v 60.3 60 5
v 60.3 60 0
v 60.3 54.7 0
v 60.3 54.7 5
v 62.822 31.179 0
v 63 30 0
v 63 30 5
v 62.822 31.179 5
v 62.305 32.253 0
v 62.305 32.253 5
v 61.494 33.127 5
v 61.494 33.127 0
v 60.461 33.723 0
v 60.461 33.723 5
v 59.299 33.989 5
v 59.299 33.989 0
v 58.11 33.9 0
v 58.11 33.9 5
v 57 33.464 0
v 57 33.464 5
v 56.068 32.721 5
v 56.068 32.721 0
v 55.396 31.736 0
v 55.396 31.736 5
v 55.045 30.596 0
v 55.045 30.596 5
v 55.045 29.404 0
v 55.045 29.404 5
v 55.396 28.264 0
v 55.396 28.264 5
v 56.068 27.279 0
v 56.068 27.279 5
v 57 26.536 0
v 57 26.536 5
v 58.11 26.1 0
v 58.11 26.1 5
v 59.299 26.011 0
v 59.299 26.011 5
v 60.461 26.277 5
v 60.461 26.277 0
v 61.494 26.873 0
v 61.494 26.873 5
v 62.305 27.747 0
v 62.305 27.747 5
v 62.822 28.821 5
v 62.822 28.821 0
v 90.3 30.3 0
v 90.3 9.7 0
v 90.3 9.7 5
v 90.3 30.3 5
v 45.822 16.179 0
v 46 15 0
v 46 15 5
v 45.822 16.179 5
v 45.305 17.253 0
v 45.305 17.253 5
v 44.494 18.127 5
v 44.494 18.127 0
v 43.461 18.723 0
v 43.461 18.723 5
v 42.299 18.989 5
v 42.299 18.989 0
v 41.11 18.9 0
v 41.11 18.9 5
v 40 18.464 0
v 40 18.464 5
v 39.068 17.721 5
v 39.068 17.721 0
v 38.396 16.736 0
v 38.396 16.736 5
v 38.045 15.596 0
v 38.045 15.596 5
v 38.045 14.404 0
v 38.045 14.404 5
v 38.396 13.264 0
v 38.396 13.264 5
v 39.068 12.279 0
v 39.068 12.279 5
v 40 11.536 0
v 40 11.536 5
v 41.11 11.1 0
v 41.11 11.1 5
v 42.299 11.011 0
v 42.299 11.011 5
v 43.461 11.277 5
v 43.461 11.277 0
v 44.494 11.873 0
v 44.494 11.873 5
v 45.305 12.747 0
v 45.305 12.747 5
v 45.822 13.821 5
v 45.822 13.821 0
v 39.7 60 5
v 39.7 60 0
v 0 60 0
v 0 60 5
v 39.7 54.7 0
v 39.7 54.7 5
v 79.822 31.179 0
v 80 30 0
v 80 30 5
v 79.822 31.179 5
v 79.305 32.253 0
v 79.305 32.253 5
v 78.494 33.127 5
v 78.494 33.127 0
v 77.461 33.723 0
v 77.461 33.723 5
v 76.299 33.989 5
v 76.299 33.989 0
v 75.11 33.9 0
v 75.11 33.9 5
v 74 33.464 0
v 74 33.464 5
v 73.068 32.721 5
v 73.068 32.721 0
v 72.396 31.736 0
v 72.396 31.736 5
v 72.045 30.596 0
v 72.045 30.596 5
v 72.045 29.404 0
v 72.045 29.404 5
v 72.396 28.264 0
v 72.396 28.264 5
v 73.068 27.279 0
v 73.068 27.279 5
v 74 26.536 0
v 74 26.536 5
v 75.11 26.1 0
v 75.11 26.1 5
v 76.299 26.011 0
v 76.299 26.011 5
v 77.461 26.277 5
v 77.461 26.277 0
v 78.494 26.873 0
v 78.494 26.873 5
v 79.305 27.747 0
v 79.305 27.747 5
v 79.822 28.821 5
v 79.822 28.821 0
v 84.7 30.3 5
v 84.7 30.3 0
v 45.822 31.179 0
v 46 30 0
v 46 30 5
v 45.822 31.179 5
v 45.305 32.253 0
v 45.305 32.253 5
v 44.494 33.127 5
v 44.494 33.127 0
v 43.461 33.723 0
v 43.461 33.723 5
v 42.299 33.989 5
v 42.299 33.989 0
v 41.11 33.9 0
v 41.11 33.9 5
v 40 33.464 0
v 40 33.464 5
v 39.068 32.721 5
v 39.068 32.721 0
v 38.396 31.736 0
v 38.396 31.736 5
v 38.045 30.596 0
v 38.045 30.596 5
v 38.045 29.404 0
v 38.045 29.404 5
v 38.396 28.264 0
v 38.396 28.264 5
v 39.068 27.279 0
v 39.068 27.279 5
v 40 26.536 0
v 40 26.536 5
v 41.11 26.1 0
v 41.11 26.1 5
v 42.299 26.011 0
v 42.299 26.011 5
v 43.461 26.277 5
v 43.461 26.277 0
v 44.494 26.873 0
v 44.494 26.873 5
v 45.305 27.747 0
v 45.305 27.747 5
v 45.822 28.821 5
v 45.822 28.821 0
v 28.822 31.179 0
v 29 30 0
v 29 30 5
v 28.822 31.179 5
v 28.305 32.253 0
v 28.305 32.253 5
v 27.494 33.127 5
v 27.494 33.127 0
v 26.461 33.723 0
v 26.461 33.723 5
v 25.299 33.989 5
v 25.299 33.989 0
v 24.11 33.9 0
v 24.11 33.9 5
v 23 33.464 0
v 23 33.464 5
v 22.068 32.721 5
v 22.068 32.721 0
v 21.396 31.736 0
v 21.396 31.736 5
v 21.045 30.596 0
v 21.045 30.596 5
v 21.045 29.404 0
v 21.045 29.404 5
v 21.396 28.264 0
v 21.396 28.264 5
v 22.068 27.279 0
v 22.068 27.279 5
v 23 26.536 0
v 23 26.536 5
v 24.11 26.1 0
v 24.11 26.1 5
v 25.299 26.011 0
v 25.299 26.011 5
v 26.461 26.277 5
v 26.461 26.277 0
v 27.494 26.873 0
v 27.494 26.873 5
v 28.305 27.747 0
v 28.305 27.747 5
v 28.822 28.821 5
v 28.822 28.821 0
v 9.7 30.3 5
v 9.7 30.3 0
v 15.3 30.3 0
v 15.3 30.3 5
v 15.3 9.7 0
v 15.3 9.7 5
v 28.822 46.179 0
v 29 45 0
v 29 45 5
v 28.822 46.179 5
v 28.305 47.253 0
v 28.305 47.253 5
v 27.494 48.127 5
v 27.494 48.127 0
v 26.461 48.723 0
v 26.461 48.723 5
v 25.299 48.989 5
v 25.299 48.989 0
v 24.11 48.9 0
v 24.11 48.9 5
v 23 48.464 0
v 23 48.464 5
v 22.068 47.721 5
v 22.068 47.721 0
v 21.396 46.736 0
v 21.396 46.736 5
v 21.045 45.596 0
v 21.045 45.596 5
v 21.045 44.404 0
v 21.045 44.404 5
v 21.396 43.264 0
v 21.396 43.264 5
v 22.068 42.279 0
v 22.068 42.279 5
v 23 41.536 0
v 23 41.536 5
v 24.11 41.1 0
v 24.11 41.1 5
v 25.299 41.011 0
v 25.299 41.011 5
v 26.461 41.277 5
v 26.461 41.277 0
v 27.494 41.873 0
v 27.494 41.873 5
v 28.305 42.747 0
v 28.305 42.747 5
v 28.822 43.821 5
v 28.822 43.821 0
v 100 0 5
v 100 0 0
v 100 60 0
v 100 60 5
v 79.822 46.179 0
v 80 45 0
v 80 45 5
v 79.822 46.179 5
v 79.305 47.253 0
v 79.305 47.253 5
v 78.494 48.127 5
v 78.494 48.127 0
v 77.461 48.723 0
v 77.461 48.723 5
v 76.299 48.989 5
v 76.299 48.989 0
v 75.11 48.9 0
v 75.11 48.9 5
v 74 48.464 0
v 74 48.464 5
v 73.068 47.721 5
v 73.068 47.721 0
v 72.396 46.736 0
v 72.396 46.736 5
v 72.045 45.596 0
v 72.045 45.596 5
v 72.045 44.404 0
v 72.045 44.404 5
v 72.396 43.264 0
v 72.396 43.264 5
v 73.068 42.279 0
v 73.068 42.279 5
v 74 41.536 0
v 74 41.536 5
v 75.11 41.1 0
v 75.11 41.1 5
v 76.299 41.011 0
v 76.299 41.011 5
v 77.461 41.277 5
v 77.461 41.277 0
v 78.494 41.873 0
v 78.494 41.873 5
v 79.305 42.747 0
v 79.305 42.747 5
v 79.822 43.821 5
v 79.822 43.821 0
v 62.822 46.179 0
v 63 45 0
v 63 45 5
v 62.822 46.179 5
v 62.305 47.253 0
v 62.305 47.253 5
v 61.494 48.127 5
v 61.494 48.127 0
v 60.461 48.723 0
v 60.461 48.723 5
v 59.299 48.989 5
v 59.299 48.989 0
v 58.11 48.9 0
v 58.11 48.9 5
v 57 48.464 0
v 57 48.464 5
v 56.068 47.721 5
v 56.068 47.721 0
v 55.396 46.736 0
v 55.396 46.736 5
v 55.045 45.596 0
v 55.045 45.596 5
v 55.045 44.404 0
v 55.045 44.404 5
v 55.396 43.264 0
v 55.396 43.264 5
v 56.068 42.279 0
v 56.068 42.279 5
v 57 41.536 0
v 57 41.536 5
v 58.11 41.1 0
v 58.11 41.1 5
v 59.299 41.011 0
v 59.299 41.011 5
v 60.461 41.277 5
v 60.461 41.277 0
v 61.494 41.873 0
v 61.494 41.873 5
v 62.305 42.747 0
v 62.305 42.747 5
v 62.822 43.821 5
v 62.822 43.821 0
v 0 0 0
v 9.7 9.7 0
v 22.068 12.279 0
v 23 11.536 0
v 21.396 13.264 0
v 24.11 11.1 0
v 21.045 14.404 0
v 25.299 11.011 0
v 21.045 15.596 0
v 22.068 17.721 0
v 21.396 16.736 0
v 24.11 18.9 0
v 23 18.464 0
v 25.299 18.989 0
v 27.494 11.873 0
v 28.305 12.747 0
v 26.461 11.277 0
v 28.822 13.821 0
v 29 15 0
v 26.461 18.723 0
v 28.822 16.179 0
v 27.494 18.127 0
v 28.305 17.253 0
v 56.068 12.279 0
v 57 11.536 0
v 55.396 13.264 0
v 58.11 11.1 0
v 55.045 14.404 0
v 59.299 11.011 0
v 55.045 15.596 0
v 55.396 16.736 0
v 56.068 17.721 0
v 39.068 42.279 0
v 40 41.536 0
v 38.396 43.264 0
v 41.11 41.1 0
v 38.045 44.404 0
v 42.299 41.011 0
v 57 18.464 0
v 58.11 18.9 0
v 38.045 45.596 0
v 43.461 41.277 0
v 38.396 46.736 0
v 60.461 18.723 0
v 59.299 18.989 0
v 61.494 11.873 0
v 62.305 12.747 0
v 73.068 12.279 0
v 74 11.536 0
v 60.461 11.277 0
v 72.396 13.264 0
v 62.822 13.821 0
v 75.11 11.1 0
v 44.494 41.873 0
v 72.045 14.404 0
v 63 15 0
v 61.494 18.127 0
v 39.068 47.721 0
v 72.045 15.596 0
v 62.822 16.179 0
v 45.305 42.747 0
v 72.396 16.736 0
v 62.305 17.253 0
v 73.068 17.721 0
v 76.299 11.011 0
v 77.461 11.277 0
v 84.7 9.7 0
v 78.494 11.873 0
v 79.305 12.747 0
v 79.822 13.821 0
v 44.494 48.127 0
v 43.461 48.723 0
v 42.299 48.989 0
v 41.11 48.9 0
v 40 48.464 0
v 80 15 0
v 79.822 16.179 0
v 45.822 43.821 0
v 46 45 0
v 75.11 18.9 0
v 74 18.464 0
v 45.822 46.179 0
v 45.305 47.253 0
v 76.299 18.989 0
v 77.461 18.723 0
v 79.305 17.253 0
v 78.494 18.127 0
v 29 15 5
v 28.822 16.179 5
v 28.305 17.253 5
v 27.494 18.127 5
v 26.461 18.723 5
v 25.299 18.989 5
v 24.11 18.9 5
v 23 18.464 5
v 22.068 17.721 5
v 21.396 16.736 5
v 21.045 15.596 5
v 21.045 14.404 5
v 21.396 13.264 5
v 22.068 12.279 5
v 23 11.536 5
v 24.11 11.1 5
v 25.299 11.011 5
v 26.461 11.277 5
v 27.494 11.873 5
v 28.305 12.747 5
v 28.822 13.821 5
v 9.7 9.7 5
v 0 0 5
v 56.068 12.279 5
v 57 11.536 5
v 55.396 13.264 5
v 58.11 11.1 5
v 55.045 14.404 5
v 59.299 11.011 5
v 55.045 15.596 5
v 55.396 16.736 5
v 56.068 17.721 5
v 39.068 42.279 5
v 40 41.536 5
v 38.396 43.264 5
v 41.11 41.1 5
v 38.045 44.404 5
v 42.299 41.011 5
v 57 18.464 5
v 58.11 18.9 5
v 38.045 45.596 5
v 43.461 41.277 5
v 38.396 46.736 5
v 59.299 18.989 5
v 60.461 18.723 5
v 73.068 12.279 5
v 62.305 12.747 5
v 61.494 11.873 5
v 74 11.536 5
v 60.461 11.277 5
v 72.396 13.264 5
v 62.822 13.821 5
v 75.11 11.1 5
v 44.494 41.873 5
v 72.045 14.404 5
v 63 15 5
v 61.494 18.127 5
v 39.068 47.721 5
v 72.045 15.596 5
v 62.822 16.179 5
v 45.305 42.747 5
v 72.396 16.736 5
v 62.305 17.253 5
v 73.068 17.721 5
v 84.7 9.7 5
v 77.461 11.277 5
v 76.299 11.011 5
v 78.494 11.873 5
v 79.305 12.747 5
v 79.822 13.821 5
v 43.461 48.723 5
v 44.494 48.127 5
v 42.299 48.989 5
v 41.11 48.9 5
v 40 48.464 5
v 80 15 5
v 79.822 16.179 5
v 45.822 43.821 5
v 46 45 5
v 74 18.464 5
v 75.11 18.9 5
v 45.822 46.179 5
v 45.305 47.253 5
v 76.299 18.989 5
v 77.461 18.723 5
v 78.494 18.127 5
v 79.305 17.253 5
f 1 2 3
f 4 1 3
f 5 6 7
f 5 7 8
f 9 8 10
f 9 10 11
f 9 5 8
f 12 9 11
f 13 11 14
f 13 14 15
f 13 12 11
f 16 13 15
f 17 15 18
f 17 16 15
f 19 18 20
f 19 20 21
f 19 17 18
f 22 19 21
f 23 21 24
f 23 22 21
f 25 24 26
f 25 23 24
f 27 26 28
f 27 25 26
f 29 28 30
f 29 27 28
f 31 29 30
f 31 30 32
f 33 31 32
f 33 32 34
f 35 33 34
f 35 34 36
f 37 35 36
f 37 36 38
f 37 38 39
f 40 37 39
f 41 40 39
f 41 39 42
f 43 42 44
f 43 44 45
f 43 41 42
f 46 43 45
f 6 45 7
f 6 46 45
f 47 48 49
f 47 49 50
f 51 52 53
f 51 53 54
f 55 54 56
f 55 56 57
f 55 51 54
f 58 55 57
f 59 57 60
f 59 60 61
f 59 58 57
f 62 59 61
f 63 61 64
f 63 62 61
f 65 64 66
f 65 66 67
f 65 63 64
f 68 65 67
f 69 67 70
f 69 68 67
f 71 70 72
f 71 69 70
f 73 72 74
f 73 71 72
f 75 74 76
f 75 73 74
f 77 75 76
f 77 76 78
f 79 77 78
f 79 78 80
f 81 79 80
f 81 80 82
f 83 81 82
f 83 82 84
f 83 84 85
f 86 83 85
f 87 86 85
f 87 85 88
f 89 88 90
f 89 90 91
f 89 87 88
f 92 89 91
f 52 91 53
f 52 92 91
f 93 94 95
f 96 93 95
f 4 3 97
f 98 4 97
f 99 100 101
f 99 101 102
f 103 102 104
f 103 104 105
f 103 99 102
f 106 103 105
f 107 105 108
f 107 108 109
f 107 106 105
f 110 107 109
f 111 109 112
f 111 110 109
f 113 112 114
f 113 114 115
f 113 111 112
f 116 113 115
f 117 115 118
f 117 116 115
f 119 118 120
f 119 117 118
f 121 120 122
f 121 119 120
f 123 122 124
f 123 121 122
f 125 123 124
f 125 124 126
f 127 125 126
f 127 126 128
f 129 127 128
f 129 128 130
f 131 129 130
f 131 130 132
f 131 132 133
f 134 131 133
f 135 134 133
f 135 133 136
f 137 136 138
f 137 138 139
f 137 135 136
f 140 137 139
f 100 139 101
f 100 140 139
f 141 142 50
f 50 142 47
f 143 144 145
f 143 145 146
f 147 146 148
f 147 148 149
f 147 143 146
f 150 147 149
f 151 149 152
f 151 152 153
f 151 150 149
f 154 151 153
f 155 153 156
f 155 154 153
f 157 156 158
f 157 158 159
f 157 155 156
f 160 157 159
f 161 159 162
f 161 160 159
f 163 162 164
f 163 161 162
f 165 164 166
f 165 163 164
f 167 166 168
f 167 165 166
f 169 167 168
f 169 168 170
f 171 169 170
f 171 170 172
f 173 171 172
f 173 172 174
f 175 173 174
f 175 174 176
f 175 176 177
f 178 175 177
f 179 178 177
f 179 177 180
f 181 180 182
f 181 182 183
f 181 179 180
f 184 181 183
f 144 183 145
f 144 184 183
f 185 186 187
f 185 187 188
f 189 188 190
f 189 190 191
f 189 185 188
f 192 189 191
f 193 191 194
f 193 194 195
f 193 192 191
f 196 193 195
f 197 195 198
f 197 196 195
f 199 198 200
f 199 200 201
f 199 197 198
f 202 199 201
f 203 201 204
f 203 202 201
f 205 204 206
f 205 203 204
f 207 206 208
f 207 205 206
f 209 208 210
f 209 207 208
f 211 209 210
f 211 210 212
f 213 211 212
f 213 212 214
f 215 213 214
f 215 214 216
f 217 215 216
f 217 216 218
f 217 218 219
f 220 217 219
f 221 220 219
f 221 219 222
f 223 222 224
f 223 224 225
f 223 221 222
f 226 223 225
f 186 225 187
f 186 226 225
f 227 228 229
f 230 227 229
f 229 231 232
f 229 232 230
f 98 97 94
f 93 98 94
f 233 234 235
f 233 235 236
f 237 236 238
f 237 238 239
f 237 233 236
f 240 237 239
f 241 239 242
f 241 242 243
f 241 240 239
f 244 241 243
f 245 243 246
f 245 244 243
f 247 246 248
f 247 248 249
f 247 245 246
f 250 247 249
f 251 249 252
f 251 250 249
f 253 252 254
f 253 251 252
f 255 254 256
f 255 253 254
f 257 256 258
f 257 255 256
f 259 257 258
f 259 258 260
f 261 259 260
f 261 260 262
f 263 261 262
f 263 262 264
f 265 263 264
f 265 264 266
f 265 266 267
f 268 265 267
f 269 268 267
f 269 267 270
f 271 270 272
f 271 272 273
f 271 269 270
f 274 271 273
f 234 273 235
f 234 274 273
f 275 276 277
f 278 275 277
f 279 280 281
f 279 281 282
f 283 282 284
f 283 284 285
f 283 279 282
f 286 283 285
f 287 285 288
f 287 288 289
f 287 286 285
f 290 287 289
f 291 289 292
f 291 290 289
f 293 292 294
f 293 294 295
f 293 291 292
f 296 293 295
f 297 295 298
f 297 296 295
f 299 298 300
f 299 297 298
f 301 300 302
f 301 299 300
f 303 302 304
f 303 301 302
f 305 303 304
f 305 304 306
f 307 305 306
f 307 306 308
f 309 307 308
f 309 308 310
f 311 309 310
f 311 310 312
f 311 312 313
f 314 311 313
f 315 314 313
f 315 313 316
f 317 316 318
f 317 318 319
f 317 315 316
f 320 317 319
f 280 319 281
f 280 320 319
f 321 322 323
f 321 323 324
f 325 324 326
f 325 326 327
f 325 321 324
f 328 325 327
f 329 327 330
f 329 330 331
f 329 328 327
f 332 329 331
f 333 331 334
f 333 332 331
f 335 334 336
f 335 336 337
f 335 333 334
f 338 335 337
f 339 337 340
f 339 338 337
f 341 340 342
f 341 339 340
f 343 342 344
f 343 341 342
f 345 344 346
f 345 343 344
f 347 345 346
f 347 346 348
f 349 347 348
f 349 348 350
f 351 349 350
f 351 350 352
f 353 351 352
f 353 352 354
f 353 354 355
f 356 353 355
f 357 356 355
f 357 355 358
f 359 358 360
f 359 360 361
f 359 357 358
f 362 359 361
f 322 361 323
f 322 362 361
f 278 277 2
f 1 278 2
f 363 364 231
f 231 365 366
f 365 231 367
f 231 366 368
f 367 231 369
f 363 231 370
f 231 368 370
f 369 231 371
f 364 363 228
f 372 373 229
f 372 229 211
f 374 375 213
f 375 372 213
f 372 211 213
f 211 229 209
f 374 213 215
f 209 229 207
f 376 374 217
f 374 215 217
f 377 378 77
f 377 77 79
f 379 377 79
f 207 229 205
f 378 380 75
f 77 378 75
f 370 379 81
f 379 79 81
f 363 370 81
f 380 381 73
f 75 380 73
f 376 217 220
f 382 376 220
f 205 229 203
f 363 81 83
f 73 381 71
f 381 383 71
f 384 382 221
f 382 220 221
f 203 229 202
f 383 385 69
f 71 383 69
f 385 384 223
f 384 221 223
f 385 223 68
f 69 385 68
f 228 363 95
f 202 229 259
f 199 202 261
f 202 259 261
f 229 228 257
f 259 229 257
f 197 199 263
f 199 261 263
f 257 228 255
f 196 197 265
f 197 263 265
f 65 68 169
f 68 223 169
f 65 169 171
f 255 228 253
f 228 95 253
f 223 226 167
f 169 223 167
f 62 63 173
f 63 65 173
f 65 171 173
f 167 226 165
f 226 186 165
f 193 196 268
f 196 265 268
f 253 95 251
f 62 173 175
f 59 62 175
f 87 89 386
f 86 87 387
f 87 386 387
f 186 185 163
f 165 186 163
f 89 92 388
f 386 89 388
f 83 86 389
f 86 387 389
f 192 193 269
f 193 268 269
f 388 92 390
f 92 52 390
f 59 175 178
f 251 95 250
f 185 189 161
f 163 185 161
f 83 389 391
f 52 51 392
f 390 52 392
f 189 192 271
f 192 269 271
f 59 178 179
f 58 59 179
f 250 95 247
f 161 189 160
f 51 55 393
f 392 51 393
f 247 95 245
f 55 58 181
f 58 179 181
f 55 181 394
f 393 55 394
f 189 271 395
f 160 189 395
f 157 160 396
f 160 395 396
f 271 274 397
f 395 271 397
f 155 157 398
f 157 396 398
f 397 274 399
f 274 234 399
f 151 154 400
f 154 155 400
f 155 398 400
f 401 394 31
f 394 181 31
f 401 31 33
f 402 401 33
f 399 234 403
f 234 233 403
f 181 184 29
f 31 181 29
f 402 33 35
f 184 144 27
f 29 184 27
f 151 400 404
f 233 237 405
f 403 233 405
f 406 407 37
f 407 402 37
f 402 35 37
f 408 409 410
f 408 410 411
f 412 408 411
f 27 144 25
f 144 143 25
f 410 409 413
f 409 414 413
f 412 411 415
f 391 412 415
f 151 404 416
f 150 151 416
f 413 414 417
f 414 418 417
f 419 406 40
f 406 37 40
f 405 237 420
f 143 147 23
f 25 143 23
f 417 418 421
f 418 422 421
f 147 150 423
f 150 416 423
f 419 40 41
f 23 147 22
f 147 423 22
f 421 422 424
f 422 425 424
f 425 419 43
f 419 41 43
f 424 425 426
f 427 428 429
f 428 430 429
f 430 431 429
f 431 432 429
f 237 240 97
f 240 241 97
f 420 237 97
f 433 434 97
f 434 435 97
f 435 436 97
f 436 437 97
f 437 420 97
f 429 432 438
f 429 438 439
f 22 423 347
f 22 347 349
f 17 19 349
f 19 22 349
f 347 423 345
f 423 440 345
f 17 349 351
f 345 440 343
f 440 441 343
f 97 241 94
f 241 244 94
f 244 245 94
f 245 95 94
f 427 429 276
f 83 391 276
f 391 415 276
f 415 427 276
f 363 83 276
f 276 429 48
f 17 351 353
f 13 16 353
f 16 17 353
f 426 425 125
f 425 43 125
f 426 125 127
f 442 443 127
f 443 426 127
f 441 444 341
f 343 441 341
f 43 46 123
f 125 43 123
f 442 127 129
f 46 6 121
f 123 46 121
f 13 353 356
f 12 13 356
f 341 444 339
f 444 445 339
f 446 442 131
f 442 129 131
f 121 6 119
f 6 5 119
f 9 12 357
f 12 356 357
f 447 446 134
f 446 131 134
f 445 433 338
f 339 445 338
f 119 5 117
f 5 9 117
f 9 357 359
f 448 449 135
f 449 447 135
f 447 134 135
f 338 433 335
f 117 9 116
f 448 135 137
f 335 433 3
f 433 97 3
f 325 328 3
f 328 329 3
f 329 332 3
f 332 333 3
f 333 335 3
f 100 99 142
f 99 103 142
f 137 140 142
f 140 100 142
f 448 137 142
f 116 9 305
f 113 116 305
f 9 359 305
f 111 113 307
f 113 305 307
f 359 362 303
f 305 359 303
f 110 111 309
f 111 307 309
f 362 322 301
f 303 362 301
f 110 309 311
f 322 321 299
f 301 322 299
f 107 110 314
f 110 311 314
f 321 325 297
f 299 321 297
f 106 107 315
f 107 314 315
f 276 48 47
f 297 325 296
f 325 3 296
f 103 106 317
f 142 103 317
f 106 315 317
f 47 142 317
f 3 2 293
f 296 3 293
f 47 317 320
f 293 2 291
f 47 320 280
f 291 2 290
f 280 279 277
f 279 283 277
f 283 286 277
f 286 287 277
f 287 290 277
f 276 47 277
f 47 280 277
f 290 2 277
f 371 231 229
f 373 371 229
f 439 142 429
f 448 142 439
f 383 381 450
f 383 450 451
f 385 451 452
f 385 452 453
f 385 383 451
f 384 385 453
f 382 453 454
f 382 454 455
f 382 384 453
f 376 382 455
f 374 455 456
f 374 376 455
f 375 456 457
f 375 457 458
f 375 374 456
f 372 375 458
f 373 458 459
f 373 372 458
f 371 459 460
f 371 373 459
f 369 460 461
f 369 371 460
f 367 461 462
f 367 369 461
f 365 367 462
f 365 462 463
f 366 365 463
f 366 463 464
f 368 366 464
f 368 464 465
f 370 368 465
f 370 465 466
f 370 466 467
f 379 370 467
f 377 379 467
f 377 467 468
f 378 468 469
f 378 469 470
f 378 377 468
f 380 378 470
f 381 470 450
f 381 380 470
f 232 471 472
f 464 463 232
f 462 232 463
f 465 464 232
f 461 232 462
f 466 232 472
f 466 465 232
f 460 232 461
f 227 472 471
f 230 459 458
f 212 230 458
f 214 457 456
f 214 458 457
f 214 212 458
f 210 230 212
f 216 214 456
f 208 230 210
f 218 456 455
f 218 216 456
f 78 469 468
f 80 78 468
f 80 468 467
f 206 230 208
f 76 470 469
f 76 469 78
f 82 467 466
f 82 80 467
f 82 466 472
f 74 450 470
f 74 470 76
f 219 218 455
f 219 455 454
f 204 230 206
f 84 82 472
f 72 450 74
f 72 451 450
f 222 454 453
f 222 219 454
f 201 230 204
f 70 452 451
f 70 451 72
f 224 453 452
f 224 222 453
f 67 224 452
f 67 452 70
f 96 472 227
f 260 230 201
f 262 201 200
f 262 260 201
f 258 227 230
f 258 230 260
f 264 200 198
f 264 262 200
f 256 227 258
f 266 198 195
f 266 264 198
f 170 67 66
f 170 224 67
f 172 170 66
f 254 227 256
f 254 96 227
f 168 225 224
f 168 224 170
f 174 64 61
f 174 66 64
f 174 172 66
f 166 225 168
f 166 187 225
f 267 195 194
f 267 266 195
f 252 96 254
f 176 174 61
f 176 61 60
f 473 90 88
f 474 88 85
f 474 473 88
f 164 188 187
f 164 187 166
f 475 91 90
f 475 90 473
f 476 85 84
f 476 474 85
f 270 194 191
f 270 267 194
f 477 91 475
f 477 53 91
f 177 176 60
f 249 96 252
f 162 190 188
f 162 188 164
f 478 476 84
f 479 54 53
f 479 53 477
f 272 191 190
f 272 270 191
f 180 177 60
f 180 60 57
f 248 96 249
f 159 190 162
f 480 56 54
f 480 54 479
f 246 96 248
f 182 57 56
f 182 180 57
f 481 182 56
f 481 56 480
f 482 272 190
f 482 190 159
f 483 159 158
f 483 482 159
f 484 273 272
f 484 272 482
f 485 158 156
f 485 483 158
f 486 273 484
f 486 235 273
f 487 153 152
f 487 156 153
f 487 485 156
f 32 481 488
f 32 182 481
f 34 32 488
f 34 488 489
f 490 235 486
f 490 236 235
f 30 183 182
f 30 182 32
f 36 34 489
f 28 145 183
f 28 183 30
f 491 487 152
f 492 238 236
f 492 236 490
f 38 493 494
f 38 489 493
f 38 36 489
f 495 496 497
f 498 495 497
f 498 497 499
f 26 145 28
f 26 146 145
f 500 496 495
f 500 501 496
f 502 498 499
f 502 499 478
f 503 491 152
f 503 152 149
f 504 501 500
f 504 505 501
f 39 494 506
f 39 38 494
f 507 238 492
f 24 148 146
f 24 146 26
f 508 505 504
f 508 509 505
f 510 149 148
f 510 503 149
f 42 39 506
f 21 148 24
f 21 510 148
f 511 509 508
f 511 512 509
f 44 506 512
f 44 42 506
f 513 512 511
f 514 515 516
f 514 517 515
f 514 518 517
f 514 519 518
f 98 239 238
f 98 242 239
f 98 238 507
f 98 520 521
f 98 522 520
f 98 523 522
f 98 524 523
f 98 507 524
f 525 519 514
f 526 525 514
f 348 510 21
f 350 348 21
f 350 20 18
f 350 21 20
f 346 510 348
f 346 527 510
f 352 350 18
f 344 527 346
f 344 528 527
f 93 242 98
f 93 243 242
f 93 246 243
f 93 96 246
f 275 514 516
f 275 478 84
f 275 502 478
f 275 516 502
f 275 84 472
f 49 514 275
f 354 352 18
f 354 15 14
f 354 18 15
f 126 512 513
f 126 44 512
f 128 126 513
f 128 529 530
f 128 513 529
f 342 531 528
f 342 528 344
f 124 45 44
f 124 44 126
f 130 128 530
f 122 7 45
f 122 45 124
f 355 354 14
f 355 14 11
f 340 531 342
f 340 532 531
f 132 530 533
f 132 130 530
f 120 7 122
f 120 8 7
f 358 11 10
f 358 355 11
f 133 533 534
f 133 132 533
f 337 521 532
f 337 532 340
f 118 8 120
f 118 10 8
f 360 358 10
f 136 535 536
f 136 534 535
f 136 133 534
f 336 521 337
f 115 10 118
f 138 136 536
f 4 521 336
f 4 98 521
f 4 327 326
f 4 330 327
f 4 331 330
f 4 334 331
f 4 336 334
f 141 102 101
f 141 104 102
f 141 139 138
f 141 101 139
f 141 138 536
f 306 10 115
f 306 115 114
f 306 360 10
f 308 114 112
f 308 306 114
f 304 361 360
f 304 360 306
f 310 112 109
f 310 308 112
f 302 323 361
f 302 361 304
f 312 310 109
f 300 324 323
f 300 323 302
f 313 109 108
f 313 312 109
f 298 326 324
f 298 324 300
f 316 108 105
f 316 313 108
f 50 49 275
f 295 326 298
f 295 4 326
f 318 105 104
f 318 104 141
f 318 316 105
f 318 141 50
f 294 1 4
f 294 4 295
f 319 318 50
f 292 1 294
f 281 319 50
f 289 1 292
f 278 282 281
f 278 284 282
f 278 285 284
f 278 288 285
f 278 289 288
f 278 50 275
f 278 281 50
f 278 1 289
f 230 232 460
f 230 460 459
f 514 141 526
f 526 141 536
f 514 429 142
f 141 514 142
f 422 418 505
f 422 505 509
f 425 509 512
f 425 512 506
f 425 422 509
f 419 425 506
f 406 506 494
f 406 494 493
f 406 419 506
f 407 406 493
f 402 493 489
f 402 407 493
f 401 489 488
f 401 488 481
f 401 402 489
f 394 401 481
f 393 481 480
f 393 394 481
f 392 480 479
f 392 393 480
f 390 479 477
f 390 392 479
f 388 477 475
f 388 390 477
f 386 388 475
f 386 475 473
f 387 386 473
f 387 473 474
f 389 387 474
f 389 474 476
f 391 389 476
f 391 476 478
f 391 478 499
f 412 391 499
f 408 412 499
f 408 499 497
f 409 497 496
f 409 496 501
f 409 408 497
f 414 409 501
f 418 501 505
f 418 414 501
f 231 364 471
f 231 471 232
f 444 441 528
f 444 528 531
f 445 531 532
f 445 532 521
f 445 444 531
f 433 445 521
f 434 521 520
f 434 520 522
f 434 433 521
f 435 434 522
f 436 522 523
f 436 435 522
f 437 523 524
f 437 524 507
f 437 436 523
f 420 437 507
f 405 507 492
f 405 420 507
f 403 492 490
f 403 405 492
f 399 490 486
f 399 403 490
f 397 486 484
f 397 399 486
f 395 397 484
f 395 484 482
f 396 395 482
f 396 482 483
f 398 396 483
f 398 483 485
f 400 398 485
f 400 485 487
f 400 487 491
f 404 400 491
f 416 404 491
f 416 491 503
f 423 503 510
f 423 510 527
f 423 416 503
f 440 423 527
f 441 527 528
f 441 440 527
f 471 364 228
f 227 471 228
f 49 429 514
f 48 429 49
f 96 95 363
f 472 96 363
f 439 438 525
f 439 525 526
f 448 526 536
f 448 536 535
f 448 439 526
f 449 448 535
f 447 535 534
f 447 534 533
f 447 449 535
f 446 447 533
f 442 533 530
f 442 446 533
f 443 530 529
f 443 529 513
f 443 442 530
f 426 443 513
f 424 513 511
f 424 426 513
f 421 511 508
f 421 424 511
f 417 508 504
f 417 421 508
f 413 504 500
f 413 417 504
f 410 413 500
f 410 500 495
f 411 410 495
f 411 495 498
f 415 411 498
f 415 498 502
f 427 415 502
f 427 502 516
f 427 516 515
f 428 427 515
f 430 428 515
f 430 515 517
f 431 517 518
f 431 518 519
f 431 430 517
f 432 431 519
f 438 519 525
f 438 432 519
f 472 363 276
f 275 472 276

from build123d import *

# Parameters (mm, degrees)
SKETCH1_R           = 4
SKETCH1_W           = 5.6
SKETCH1_H           = 20.6
BOSS_EXTRUDE1_DEPTH = 5


with BuildPart() as part:
    # Sketch1 → Boss-Extrude1 (new body)
    with BuildSketch(Plane.XY):
        Polygon((0, 0), (100, 0), (100, 60), (60.3, 60), (60.3, 54.7), (39.7, 54.7), (39.7, 60), (0, 60), align=None)
        with Locations((25, 45)):
            Circle(SKETCH1_R, mode=Mode.SUBTRACT)
        with Locations((42, 45)):
            Circle(SKETCH1_R, mode=Mode.SUBTRACT)
        with Locations((59, 45)):
            Circle(SKETCH1_R, mode=Mode.SUBTRACT)
        with Locations((76, 45)):
            Circle(SKETCH1_R, mode=Mode.SUBTRACT)
        with Locations((42, 30)):
            Circle(SKETCH1_R, mode=Mode.SUBTRACT)
        with Locations((59, 30)):
            Circle(SKETCH1_R, mode=Mode.SUBTRACT)
        with Locations((76, 30)):
            Circle(SKETCH1_R, mode=Mode.SUBTRACT)
        with Locations((42, 15)):
            Circle(SKETCH1_R, mode=Mode.SUBTRACT)
        with Locations((59, 15)):
            Circle(SKETCH1_R, mode=Mode.SUBTRACT)
        with Locations((76, 15)):
            Circle(SKETCH1_R, mode=Mode.SUBTRACT)
        with Locations((25, 30)):
            Circle(SKETCH1_R, mode=Mode.SUBTRACT)
        with Locations((25, 15)):
            Circle(SKETCH1_R, mode=Mode.SUBTRACT)
        with Locations((12.5, 20)):
            Rectangle(SKETCH1_W, SKETCH1_H, mode=Mode.SUBTRACT)
        with Locations((87.5, 20)):
            Rectangle(SKETCH1_W, SKETCH1_H, mode=Mode.SUBTRACT)
    extrude(amount=BOSS_EXTRUDE1_DEPTH)


solid = part.part
